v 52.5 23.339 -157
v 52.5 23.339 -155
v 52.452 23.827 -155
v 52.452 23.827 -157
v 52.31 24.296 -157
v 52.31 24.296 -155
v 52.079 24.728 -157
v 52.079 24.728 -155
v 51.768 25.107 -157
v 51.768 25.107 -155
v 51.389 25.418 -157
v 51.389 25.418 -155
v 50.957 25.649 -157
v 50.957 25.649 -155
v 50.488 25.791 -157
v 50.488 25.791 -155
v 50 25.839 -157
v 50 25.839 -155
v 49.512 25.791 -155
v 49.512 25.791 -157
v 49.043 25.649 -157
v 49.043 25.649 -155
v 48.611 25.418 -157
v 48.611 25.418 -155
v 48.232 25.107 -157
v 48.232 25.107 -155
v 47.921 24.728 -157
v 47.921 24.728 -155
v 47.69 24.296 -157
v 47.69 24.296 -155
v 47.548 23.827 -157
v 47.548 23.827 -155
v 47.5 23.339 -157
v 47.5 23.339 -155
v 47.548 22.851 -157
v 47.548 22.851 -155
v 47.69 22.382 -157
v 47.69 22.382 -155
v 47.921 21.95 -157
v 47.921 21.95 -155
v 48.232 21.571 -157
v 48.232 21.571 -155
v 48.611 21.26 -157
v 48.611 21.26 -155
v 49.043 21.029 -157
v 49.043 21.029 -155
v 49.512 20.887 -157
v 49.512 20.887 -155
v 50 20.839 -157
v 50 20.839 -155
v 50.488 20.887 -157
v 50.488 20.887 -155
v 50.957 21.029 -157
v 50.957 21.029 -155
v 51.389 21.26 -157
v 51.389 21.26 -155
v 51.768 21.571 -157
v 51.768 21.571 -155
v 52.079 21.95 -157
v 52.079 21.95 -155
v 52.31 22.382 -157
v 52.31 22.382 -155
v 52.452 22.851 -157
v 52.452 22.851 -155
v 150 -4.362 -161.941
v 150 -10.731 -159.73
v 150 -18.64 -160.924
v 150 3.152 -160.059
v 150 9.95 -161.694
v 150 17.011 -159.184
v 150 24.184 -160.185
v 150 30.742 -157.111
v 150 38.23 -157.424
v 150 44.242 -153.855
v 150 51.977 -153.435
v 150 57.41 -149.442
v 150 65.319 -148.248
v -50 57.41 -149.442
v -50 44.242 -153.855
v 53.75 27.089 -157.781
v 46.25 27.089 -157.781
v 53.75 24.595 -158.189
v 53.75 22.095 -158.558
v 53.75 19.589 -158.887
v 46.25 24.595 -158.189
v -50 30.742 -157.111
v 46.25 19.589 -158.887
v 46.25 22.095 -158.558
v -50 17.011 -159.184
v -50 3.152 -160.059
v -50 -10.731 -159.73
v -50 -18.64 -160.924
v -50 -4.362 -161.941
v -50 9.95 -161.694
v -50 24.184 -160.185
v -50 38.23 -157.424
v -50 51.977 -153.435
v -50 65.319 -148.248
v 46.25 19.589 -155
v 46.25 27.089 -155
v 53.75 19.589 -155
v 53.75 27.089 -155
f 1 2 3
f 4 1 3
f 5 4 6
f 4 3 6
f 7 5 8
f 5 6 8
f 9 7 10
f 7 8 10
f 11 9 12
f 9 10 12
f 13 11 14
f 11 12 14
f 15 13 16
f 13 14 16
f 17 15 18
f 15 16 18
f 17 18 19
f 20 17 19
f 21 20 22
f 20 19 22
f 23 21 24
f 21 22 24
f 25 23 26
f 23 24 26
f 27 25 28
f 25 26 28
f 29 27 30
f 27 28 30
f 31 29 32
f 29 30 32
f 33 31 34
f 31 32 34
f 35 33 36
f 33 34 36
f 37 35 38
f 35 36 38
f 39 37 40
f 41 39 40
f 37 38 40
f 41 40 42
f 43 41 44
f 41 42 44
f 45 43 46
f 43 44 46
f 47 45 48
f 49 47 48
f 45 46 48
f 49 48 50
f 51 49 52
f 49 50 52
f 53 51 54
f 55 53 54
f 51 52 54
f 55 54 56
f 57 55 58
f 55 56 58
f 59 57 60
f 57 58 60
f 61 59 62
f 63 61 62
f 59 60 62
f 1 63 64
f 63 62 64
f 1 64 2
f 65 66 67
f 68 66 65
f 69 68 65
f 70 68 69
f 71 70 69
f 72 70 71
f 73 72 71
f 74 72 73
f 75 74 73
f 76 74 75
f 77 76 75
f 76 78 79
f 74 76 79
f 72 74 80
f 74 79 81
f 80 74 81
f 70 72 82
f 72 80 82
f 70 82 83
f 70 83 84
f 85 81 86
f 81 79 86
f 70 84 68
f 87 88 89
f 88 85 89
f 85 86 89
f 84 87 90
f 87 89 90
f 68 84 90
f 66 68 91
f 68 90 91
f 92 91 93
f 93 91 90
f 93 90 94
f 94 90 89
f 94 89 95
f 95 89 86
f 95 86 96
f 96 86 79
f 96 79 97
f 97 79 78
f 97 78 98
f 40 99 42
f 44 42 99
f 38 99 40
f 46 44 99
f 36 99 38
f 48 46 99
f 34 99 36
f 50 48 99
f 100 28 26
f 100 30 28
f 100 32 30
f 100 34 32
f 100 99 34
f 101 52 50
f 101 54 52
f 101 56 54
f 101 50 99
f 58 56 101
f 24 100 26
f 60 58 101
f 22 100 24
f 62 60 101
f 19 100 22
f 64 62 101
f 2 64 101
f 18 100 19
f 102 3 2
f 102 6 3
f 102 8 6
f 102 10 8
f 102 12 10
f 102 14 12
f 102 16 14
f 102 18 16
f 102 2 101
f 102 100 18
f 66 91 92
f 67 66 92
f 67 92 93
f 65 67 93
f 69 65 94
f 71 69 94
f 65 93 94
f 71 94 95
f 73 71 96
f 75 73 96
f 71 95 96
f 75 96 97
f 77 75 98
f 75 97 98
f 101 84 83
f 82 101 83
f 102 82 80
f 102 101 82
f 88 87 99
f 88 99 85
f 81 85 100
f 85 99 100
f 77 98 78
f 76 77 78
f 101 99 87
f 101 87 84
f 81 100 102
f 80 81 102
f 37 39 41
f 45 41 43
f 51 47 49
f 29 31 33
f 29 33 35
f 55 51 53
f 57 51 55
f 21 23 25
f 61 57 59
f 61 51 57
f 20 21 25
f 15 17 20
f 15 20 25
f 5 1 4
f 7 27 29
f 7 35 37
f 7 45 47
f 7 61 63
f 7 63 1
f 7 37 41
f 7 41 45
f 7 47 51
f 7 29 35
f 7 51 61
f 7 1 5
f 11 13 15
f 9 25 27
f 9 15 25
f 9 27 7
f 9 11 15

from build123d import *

# Parameters (mm, degrees)
BOSS_EXTRUDE2_DEPTH      = 150
BOSS_EXTRUDE2_DEPTH_BACK = 50
BOSS_EXTRUDE3_REACH      = 387.24
BOSS_EXTRUDE3_END_RADIUS = 160.09
BOSS_EXTRUDE3_START      = -155
SKETCH2_W                = 7.5
SKETCH2_H                = 7.5
SKETCH3_R                = 2.5
CUT_EXTRUDE1_DEPTH       = 2


with BuildPart() as part:
    # Sketch1 → Boss-Extrude2 (new, two sides: drawn at the far end of the back side and taken through both)
    with BuildSketch(Plane(origin=(0, 0, 0), x_dir=(0, 0, -1), z_dir=(1, 0, 0)).offset(-BOSS_EXTRUDE2_DEPTH_BACK)):
        with BuildLine():
            Line((148.248037227, 65.318599636), (149.44212598, 57.409573092))
            ThreePointArc((149.44212598, 57.409573092), (158.29603806, 23.899214101), (159.729912673, -10.731407065))
            Line((159.729912673, -10.731407065), (160.924001426, -18.640433609))
            ThreePointArc((160.924001426, -18.640433609), (160.184634678, 24.18435058), (148.248037227, 65.318599636))
        make_face()
    extrude(amount=BOSS_EXTRUDE2_DEPTH + BOSS_EXTRUDE2_DEPTH_BACK)

    # Boss-Extrude3: up to this cylinder (the profile starts inside it)
    boss_extrude3_end = Plane(origin=(50, 0, 0), z_dir=(1, 0, 0)) * Cylinder(BOSS_EXTRUDE3_END_RADIUS, 1095.66, mode=Mode.PRIVATE)
    # Sketch2 → Boss-Extrude3 (add, up to the surface)
    with BuildSketch(Plane.XY.offset(BOSS_EXTRUDE3_START), mode=Mode.PRIVATE) as boss_extrude3_sk1:
        with Locations((50, 23.339083013)):
            Rectangle(SKETCH2_W, SKETCH2_H)
    boss_extrude3_tool1 = extrude(boss_extrude3_sk1.sketch, amount=-BOSS_EXTRUDE3_REACH, mode=Mode.PRIVATE) & boss_extrude3_end
    add(boss_extrude3_tool1.solids().sort_by_distance((50, 23.339083, -155))[0])

    # Sketch3 → Cut-Extrude1 (cut)
    with BuildSketch(Plane.XY.offset(-155)):
        with Locations((50, 23.339083013)):
            Circle(SKETCH3_R)
    extrude(amount=-CUT_EXTRUDE1_DEPTH, mode=Mode.SUBTRACT)


solid = part.part
